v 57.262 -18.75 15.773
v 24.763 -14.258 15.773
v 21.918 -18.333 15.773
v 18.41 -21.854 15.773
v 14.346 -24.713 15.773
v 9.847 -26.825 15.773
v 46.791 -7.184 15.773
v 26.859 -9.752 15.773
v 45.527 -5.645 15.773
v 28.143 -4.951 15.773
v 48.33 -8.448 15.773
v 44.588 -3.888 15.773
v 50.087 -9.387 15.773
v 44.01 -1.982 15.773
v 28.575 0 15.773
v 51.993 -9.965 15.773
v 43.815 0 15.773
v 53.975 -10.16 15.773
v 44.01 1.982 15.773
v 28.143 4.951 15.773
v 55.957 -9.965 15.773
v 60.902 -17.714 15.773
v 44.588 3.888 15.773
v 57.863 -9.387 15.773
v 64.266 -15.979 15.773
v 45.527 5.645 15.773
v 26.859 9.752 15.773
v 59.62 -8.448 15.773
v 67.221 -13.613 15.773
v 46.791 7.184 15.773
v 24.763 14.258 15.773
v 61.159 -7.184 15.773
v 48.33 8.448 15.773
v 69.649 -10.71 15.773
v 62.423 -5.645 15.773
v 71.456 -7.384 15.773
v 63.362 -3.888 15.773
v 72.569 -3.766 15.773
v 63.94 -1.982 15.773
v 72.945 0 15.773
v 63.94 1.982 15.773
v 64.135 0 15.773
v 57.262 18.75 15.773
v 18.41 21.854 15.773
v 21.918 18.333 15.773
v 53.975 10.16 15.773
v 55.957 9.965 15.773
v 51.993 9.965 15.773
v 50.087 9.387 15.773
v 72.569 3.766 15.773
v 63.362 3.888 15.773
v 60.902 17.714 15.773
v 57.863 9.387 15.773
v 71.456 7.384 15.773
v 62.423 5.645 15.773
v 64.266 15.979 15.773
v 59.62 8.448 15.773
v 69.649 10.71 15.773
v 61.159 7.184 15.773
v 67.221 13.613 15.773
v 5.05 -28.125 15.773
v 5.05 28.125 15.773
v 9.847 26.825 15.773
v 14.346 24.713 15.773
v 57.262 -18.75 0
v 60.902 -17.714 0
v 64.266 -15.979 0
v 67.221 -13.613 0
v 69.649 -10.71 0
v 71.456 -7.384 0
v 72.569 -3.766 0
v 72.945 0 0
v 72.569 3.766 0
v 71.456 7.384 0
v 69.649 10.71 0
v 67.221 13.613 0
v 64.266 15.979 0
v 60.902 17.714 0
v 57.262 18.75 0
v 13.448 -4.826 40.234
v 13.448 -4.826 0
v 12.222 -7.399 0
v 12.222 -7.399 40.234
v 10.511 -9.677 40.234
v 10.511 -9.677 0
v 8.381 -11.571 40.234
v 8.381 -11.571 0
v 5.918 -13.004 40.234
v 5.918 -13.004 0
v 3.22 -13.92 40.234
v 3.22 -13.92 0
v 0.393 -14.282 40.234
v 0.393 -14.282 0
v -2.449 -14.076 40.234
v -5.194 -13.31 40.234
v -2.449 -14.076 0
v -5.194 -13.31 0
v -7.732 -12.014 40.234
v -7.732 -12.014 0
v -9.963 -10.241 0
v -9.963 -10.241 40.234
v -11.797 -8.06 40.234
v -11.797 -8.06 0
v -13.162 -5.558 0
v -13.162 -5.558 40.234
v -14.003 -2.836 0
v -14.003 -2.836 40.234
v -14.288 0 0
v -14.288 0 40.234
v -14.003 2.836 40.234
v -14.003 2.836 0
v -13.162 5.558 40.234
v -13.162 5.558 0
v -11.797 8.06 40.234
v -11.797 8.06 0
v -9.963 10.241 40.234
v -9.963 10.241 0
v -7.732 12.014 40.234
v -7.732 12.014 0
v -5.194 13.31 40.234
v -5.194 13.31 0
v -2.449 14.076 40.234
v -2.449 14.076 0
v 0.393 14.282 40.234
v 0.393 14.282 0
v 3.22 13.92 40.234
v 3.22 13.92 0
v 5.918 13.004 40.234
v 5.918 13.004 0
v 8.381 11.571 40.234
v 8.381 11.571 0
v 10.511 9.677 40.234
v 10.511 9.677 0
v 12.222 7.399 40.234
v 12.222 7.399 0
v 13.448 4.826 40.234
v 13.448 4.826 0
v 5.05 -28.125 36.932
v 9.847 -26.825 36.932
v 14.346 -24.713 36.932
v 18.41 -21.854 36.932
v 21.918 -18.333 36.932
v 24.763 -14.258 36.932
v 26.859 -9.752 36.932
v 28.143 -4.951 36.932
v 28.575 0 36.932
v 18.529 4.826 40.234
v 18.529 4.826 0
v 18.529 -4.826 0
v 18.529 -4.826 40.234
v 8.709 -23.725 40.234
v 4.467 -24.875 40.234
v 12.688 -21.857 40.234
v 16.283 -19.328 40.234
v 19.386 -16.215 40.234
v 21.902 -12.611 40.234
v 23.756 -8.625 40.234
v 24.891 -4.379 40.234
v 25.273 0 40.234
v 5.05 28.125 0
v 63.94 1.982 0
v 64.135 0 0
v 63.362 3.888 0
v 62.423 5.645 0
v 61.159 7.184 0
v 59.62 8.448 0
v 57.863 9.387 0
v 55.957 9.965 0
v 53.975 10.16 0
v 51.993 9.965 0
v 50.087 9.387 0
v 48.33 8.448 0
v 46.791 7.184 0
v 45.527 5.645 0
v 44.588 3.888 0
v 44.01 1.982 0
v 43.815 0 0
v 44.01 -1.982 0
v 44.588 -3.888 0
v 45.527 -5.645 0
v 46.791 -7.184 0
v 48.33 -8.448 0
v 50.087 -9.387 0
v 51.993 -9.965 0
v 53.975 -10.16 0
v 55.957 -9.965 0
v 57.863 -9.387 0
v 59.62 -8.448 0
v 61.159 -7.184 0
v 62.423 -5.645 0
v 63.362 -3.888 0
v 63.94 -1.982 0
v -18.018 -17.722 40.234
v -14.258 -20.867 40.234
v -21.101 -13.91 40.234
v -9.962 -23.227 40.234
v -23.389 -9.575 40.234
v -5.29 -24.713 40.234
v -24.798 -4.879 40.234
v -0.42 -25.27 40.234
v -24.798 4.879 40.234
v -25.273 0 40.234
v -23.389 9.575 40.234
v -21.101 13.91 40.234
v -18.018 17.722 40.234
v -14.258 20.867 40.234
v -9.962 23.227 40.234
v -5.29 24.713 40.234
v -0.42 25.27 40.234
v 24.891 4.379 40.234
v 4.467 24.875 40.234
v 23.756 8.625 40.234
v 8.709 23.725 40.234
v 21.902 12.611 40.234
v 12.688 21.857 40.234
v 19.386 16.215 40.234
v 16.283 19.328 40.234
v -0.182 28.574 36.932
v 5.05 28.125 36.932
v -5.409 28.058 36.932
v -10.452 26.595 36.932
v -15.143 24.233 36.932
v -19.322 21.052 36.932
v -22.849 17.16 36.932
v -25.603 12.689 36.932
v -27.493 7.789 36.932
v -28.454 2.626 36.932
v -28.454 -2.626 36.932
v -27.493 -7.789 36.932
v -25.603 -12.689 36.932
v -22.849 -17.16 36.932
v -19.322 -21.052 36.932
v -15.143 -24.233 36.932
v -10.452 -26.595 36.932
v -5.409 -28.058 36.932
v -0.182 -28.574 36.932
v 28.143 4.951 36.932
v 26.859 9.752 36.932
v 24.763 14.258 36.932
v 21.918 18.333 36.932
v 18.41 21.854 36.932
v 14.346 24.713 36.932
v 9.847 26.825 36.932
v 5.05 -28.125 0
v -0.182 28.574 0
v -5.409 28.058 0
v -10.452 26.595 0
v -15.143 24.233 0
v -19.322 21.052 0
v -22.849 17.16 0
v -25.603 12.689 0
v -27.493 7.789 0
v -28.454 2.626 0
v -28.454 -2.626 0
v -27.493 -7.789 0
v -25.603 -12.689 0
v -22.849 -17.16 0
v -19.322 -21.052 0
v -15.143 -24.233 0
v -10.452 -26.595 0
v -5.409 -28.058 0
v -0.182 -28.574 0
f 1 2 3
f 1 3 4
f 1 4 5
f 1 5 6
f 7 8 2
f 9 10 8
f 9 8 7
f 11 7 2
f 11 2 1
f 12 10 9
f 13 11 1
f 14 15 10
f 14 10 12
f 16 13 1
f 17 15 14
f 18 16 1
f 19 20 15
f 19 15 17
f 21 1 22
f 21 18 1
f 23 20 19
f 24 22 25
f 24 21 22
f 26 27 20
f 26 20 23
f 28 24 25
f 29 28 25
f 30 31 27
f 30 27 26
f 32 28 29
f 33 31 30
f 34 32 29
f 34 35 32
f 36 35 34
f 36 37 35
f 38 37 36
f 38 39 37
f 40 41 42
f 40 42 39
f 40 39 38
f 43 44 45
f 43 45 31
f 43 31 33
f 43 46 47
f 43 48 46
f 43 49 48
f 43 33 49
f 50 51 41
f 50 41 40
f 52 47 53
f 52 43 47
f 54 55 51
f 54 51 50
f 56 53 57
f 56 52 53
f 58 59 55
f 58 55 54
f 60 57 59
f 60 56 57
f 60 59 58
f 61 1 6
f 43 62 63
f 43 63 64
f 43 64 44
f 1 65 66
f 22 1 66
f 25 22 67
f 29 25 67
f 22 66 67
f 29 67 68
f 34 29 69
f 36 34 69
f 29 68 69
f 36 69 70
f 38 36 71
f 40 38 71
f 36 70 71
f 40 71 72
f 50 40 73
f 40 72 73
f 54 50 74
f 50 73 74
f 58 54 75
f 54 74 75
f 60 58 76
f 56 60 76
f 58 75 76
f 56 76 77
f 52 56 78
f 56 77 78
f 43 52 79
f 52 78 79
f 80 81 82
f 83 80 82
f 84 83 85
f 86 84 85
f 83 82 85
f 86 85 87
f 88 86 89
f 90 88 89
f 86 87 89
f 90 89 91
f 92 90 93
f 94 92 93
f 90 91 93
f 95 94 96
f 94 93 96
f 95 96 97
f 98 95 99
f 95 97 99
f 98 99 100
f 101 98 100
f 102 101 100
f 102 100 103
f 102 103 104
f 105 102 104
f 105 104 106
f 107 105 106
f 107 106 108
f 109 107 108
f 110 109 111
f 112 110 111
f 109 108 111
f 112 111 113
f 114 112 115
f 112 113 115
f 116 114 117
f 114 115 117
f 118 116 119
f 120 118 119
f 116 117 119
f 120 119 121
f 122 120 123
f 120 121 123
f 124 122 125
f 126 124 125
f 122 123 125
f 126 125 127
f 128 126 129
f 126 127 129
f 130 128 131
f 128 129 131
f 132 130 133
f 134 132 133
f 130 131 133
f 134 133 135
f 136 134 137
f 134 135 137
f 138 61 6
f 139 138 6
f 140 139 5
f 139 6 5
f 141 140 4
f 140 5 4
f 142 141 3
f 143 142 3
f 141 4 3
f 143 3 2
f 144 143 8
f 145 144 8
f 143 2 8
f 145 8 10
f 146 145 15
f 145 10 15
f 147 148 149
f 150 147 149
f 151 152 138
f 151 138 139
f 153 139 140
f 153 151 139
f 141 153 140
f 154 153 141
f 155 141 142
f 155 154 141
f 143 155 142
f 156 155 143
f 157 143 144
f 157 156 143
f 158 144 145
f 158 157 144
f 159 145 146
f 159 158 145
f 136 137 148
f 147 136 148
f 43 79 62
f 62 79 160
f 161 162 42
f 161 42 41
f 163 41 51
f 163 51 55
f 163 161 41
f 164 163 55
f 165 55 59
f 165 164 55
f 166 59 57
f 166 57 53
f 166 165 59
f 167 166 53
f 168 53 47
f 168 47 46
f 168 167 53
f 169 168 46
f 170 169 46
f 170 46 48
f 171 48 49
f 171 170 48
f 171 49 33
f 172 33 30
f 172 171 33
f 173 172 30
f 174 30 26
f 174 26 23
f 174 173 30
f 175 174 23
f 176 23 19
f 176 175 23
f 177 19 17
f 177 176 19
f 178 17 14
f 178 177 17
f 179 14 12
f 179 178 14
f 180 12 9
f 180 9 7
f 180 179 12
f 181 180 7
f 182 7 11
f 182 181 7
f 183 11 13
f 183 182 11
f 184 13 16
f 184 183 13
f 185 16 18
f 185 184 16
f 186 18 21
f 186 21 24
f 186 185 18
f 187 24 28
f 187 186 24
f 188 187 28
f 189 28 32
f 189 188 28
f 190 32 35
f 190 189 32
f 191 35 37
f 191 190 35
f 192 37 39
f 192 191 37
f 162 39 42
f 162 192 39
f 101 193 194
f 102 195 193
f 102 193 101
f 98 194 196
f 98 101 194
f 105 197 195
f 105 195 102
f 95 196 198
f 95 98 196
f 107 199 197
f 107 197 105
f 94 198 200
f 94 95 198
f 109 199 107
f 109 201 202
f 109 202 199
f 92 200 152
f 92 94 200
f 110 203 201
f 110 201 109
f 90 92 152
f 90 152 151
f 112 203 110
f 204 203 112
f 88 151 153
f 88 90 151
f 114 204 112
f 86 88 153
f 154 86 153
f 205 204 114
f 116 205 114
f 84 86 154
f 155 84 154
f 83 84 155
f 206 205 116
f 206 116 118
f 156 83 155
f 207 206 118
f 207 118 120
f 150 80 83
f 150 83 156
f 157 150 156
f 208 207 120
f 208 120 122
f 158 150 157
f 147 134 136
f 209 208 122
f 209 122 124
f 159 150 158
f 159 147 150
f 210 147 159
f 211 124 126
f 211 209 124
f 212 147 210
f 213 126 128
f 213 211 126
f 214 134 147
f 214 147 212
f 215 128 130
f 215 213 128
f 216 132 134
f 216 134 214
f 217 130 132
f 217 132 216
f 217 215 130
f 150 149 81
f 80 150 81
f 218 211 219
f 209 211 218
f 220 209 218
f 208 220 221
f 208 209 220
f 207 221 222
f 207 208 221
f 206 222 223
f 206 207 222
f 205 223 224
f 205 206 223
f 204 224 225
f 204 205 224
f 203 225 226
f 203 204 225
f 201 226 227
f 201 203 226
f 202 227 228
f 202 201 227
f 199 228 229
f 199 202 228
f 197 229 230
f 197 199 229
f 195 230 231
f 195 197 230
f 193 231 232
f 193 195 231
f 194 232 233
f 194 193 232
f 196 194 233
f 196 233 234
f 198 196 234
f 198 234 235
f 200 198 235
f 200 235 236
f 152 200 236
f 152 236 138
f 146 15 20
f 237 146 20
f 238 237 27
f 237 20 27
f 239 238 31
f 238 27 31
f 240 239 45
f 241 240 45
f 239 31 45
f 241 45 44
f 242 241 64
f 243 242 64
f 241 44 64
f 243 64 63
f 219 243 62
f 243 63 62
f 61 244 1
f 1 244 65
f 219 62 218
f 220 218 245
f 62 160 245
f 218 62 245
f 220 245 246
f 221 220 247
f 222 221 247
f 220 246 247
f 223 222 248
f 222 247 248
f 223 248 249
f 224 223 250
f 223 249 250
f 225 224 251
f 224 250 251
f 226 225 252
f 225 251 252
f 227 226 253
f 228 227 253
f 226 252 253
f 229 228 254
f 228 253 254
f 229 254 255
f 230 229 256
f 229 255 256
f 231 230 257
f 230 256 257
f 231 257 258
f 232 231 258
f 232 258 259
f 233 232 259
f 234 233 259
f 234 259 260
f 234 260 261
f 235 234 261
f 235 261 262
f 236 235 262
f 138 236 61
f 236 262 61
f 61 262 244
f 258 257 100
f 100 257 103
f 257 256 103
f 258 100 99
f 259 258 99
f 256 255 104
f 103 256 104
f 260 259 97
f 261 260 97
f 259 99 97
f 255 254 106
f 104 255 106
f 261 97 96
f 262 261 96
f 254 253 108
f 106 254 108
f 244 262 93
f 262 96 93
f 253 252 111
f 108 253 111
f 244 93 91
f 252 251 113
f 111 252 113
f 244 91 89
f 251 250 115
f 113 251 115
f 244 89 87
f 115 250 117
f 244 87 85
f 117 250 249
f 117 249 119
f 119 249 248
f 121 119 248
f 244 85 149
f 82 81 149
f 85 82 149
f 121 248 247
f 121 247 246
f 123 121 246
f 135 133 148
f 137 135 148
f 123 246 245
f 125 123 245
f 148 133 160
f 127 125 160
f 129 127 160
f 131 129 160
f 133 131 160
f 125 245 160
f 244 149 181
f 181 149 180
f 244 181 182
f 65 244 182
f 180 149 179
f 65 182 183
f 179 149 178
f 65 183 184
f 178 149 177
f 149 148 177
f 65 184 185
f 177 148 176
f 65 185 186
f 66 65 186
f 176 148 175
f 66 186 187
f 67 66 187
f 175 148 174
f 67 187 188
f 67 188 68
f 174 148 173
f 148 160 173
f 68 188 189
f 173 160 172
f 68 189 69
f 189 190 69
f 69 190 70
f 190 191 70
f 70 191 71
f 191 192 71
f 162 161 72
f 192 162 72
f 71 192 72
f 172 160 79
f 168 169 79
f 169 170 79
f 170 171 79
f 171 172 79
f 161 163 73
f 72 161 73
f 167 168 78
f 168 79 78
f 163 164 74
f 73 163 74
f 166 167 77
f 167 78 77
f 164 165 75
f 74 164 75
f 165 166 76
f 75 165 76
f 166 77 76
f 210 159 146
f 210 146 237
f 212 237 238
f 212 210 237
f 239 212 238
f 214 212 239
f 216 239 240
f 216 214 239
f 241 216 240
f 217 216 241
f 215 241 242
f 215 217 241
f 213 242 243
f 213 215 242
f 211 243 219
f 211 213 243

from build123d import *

# Parameters (mm, degrees)
F1_DEPTH = 40.2336
F0_R     = 10.16
F2_DEPTH = 15.7734
F3_SIZE  = 3.302


with BuildPart() as f1:
    # F0 (on Top) → F1 (new body)
    with BuildSketch(Plane.XY):
        with BuildLine():
            ThreePointArc((5.050141, -28.125197), (21.918467, -18.333342), (28.575, 0))
            ThreePointArc((28.575, 0), (21.918467, 18.333342), (5.050141, 28.125197))
            ThreePointArc((5.050141, 28.125197), (-28.575, 0), (5.050141, -28.125197))
        make_face()
        with BuildLine():
            ThreePointArc((13.447765, -4.826), (-14.2875, 0), (13.447765, 4.826))
            Line((13.447765, 4.826), (18.5293, 4.826))
            Line((18.5293, 4.826), (18.5293, -4.826))
            Line((18.5293, -4.826), (13.447765, -4.826))
        make_face(mode=Mode.SUBTRACT)
    extrude(amount=F1_DEPTH)

    # F0 (on Top) → F2 (join)
    with BuildSketch(Plane.XY):
        with BuildLine():
            ThreePointArc((5.050141, 28.125197), (21.918467, 18.333342), (28.575, 0))
            ThreePointArc((28.575, 0), (21.918467, -18.333342), (5.050141, -28.125197))
            Line((5.050141, -28.125197), (57.261665, -18.750131))
            ThreePointArc((57.261665, -18.750131), (72.944904, 0), (57.261665, 18.750131))
            Line((57.261665, 18.750131), (5.050141, 28.125197))
        make_face()
        with Locations((53.975, 0)):
            Circle(F0_R, mode=Mode.SUBTRACT)
    extrude(amount=F2_DEPTH)

    # F3
    f3_edges = [f1.edges().sort_by_distance(p)[0] for p in [
        (-5.050141, 28.125197, 40.2336),
    ]]
    chamfer(f3_edges, length=F3_SIZE)


solid = f1.part
